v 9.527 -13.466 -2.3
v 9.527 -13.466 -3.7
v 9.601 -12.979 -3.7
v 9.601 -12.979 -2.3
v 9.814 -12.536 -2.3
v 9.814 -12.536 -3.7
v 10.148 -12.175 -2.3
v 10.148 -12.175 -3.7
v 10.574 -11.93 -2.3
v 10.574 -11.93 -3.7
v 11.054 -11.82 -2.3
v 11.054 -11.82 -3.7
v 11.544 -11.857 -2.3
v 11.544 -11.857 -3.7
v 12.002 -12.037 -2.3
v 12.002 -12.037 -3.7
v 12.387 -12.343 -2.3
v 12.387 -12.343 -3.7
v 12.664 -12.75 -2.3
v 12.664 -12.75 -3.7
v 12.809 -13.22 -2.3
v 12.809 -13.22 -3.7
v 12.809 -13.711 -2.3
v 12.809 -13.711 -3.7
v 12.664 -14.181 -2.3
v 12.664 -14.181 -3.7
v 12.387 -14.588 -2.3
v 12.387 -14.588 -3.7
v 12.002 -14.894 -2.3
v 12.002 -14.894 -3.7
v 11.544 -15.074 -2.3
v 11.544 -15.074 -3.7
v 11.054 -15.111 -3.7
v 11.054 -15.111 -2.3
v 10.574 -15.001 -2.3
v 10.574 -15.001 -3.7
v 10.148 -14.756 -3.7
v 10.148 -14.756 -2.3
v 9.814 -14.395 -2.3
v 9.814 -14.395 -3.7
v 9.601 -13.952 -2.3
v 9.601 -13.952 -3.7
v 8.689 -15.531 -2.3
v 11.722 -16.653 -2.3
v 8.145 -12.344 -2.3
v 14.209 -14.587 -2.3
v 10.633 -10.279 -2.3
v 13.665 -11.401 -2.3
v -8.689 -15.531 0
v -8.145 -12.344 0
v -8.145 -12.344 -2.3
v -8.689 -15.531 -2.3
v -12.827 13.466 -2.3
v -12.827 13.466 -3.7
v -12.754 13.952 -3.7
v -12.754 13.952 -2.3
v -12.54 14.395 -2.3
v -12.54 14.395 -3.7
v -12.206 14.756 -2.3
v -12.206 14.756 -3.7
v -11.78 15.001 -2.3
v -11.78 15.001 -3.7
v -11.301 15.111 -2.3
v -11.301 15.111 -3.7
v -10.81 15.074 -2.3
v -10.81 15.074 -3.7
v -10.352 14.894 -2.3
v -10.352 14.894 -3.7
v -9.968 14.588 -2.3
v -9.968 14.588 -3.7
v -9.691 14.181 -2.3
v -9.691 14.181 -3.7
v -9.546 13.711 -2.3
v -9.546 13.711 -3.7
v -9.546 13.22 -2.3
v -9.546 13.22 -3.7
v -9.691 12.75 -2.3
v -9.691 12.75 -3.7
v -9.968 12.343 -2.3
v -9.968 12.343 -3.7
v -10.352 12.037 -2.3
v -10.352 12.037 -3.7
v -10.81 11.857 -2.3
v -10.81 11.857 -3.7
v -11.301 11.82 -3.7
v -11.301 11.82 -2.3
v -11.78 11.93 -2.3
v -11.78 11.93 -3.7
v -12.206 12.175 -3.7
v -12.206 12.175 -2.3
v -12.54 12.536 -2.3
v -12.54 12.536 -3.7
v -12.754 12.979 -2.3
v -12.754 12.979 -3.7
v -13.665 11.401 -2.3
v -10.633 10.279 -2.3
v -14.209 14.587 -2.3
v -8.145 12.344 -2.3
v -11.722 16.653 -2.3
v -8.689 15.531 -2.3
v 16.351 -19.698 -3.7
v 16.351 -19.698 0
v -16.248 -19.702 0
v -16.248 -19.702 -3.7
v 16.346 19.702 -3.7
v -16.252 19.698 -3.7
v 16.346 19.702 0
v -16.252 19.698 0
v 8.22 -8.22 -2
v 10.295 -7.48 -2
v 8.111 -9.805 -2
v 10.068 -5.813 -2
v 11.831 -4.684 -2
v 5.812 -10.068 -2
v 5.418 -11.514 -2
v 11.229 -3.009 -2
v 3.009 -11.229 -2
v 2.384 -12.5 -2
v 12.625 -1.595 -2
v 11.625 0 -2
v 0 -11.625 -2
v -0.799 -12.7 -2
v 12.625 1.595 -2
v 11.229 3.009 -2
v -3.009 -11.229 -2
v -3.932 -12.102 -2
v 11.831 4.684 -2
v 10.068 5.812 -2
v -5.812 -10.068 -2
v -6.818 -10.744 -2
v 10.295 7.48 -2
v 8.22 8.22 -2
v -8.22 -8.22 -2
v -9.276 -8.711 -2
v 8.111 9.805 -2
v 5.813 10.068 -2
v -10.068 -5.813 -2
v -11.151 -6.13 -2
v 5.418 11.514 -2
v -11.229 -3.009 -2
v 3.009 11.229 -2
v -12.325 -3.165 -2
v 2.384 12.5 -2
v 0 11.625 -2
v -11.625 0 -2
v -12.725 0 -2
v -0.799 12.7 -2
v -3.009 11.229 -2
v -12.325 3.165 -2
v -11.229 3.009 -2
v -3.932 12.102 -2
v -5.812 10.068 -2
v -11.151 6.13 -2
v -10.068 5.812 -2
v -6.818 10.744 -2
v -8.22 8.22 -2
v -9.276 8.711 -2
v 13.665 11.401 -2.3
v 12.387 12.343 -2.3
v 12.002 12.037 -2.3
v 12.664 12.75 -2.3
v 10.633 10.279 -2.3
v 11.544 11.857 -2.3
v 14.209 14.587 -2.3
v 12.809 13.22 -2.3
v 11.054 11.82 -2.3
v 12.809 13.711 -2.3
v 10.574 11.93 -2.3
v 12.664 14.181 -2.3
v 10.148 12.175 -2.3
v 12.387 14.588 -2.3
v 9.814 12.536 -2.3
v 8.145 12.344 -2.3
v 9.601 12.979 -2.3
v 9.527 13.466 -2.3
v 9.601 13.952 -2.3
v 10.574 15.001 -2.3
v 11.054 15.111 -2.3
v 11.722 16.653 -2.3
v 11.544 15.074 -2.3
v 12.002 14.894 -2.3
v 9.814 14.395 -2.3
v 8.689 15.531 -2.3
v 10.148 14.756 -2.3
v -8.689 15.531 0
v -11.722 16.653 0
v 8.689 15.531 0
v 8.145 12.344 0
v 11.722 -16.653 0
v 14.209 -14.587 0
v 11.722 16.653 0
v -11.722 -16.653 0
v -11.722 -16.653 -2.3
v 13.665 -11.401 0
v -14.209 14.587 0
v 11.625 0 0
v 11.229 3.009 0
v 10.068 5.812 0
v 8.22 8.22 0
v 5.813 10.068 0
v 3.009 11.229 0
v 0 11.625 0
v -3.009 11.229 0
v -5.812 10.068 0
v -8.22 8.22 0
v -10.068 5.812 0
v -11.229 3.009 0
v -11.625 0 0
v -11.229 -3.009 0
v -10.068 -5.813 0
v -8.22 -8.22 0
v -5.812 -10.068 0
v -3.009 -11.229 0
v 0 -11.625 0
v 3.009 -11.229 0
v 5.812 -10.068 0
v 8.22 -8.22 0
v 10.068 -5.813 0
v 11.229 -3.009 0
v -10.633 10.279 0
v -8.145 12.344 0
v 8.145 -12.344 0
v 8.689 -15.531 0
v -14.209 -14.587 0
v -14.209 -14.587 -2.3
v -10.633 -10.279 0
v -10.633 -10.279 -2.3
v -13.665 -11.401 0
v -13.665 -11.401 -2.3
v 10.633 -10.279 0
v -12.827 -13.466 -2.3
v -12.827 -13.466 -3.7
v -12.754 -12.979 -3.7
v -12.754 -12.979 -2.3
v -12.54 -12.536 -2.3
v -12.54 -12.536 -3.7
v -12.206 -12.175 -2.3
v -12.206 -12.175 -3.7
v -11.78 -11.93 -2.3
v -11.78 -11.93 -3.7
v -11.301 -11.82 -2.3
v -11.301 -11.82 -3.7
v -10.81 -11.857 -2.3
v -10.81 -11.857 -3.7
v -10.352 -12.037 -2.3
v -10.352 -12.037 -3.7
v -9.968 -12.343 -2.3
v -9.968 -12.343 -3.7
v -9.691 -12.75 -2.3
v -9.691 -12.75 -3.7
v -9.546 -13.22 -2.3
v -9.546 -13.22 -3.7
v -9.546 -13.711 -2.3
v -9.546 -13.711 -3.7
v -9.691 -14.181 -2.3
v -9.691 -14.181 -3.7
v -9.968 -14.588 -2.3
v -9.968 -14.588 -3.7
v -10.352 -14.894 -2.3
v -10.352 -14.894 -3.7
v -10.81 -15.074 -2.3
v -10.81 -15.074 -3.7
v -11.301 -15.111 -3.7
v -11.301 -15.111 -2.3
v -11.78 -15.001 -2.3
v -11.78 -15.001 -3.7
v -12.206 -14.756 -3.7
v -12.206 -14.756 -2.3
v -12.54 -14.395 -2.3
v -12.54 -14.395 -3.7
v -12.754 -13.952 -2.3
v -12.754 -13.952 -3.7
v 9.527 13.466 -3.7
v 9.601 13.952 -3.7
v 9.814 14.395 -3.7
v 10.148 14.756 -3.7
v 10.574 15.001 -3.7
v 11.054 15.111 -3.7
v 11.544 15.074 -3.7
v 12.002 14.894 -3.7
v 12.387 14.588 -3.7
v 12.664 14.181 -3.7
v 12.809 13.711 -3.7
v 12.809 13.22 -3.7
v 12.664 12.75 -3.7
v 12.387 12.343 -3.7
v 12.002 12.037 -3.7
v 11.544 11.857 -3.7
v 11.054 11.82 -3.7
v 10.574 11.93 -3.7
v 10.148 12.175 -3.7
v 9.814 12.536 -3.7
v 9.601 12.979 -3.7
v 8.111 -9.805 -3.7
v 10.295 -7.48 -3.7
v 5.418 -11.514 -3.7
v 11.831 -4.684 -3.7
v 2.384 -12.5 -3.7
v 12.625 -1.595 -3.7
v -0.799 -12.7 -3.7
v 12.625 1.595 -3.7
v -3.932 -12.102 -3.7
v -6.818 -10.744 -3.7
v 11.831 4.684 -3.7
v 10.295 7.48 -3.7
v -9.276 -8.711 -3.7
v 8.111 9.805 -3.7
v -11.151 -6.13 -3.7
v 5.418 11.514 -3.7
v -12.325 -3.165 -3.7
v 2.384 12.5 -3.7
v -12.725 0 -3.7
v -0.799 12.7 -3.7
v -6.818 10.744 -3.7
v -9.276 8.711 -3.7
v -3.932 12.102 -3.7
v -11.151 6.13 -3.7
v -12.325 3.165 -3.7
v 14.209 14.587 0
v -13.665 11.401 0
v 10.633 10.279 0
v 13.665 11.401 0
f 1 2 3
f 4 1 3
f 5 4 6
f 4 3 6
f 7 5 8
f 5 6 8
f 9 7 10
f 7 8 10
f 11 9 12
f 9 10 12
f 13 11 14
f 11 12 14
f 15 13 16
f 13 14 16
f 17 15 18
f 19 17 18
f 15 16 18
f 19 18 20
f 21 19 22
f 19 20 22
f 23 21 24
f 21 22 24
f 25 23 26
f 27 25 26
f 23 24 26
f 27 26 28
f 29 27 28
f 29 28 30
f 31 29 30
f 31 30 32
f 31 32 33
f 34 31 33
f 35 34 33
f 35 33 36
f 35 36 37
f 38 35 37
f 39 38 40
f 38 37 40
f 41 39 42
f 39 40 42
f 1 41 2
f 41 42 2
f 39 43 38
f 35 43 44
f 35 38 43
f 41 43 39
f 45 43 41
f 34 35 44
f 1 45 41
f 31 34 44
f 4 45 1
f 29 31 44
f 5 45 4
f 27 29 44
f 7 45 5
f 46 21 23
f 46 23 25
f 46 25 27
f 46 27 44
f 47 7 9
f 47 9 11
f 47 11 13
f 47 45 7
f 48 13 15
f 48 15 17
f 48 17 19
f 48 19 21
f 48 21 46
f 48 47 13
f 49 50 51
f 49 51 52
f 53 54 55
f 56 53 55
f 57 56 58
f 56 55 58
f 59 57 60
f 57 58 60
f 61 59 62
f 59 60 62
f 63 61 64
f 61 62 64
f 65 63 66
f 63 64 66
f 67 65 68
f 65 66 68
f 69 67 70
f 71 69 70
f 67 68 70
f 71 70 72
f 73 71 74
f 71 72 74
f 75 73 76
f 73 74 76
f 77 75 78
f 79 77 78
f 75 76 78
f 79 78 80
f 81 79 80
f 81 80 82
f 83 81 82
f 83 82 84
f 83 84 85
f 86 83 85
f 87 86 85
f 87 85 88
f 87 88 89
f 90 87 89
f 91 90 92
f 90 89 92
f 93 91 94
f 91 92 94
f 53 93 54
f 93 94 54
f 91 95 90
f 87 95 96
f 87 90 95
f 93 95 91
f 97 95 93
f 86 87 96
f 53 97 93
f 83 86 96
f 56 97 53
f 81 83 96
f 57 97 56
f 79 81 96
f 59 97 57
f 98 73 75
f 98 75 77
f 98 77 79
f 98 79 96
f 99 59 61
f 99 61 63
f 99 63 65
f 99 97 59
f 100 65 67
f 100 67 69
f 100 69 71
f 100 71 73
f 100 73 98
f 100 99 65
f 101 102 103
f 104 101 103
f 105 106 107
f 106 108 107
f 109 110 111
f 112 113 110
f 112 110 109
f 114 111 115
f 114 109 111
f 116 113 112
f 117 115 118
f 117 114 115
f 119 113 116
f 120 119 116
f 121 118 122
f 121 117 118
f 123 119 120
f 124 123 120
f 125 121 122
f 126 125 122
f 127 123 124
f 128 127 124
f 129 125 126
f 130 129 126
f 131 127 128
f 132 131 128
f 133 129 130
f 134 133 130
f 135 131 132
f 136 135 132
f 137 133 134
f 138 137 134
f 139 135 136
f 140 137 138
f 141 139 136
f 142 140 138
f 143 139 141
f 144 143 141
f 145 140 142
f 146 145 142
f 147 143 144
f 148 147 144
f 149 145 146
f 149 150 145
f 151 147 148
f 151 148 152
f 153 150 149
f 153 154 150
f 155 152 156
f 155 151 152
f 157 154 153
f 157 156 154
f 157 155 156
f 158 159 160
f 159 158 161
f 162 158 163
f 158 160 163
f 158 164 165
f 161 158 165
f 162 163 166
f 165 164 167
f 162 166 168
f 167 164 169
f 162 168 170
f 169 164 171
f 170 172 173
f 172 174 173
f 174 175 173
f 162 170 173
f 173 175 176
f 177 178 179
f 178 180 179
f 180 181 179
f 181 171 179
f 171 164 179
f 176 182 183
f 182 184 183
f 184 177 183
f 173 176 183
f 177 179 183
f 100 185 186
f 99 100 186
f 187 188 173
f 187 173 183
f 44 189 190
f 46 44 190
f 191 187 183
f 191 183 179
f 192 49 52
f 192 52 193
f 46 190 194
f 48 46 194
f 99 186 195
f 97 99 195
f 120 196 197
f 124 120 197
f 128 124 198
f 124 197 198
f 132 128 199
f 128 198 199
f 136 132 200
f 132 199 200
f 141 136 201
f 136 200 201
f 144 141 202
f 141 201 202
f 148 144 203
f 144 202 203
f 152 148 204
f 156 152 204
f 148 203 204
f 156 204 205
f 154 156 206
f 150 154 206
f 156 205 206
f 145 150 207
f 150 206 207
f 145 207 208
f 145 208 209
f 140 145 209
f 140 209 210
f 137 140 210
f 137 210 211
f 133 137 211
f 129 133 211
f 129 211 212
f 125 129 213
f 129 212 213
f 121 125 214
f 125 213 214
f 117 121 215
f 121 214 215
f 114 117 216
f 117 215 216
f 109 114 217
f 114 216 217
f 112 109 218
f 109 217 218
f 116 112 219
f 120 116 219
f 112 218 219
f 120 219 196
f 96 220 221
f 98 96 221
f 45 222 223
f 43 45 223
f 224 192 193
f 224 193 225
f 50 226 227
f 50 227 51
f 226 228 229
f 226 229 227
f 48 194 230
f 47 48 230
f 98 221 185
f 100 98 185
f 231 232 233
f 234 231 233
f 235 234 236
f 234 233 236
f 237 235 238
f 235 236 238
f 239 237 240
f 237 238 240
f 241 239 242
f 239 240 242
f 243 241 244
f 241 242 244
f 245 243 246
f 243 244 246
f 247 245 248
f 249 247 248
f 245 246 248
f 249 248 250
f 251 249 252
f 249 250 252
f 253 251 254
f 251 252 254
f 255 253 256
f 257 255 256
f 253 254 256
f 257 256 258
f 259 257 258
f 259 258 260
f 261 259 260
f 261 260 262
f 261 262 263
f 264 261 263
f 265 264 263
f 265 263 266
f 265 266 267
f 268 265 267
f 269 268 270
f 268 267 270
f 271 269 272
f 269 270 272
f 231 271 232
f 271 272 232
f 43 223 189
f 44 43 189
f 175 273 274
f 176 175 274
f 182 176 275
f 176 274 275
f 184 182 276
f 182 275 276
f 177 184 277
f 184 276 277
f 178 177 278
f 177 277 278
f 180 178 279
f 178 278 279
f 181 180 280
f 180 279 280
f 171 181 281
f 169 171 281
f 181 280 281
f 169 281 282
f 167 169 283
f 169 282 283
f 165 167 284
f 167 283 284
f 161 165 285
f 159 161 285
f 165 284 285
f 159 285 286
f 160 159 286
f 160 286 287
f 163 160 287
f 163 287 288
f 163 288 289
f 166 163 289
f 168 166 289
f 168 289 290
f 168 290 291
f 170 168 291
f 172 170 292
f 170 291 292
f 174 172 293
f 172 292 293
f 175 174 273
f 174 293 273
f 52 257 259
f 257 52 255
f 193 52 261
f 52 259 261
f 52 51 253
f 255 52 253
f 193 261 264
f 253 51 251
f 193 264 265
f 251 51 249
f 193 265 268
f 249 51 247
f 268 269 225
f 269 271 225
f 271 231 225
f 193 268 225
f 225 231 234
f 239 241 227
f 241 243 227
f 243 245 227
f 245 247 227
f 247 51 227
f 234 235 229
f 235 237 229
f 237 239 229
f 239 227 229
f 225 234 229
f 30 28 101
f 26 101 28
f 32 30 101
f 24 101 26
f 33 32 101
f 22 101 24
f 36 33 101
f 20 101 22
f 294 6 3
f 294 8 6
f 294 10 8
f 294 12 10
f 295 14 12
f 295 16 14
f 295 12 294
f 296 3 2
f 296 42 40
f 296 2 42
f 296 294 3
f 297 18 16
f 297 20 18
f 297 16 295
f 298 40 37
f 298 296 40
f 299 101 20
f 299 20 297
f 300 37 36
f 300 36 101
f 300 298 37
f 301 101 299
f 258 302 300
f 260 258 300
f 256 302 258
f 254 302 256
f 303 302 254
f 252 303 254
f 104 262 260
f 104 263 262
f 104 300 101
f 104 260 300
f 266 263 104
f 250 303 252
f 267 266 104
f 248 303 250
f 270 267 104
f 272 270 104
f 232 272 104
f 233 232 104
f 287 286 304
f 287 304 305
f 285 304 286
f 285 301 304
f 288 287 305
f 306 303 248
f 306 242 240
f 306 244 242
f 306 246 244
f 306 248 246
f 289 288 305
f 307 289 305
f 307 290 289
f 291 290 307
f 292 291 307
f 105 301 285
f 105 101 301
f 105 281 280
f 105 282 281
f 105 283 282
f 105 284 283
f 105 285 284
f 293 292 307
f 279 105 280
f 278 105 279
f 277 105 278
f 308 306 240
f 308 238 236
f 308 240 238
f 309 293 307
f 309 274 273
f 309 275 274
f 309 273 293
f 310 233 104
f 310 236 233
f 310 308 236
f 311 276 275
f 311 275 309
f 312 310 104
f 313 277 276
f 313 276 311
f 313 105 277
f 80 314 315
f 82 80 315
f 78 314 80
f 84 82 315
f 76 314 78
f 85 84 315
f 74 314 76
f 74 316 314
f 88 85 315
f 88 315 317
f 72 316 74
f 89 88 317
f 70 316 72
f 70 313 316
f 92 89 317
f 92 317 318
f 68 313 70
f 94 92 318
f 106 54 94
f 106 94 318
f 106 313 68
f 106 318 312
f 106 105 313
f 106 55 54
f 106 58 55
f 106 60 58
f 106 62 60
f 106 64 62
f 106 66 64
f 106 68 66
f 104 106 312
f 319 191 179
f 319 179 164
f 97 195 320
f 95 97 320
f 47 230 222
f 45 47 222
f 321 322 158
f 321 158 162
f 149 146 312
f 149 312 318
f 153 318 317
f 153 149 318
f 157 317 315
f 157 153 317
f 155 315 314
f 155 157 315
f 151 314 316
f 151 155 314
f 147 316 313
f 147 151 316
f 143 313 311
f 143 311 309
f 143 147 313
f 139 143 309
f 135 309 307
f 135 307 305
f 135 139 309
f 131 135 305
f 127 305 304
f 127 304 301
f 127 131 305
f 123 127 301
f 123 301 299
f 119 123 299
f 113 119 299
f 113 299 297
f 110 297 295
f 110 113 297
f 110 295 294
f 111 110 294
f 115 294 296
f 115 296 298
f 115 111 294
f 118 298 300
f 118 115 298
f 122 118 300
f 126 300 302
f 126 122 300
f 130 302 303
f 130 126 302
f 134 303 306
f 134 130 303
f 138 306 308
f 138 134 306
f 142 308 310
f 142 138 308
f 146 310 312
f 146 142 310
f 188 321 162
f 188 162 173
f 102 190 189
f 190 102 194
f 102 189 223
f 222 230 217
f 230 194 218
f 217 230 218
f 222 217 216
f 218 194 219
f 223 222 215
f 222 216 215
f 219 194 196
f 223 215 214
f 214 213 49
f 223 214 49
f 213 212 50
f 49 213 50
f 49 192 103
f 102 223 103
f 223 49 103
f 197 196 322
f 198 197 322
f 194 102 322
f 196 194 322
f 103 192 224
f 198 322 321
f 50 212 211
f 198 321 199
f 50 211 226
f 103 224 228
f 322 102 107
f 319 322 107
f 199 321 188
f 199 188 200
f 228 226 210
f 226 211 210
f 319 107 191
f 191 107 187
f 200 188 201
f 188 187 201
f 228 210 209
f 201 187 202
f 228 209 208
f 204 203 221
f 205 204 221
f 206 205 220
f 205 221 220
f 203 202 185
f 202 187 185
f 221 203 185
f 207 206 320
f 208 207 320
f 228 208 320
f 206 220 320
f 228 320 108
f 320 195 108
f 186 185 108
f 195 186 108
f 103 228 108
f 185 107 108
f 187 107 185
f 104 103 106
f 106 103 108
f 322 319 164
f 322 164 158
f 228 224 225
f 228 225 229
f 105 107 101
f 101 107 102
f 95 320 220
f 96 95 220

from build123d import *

# Parameters (mm, degrees)
SKETCH2_R           = 11.625
BOSS_EXTRUDE1_DEPTH = 2
SKETCH3_R           = 12.725
BOSS_EXTRUDE2_DEPTH = 1.7
CUT_EXTRUDE1_DEPTH  = 2.3
SKETCH5_R           = 1.65
CUT_EXTRUDE2_DEPTH  = 1.4


with BuildPart() as part:
    # Sketch2 → Boss-Extrude1 (new body)
    with BuildSketch(Plane.XY):
        Polygon((-16.247566177, -19.702007889), (-16.252434142, 19.697992436), (16.34566541, 19.70202001), (16.350533375, -19.697980315), align=None)
        Circle(SKETCH2_R, mode=Mode.SUBTRACT)
    extrude(amount=-BOSS_EXTRUDE1_DEPTH)

    # Sketch3 → Boss-Extrude2 (add)
    with BuildSketch(Plane(origin=(0, 0, -2), x_dir=(-1, 0, 0), z_dir=(0, 0, -1))):
        Polygon((-16.350533375, -19.697980315), (16.247566177, -19.702007889), (16.252434142, 19.697992436), (-16.34566541, 19.70202001), align=None)
        Circle(SKETCH3_R, mode=Mode.SUBTRACT)
    extrude(amount=BOSS_EXTRUDE2_DEPTH)

    # Sketch4 → Cut-Extrude1 (cut)
    with BuildSketch(Plane.XY):
        Polygon((10.632742825, -10.278526808), (8.144960808, -12.343538665), (8.689422526, -15.530527019), (11.721666262, -16.652503517), (14.209448279, -14.58749166), (13.664986561, -11.400503306), align=None)
        Polygon((13.664986561, 11.400503306), (10.632742825, 10.278526808), (8.144960808, 12.343538665), (8.689422526, 15.530527019), (11.721666262, 16.652503517), (14.209448279, 14.58749166), align=None)
        Polygon((-13.664986561, 11.400503306), (-10.632742825, 10.278526808), (-8.144960808, 12.343538665), (-8.689422526, 15.530527019), (-11.721666262, 16.652503517), (-14.209448279, 14.58749166), align=None)
        Polygon((-13.664986561, -11.400503306), (-10.632742825, -10.278526808), (-8.144960808, -12.343538665), (-8.689422526, -15.530527019), (-11.721666262, -16.652503517), (-14.209448279, -14.58749166), align=None)
    extrude(amount=-CUT_EXTRUDE1_DEPTH, mode=Mode.SUBTRACT)

    # Sketch5 → Cut-Extrude2 (cut)
    with BuildSketch(Plane(origin=(0, 0, -3.7), x_dir=(-1, 0, 0), z_dir=(0, 0, -1))):
        with Locations((-11.177204543, -13.465515163)):
            Circle(SKETCH5_R)
        with Locations((-11.177204543, 13.465515163)):
            Circle(SKETCH5_R)
        with Locations((11.177204543, 13.465515163)):
            Circle(SKETCH5_R)
        with Locations((11.177204543, -13.465515163)):
            Circle(SKETCH5_R)
    extrude(amount=-CUT_EXTRUDE2_DEPTH, mode=Mode.SUBTRACT)


solid = part.part
